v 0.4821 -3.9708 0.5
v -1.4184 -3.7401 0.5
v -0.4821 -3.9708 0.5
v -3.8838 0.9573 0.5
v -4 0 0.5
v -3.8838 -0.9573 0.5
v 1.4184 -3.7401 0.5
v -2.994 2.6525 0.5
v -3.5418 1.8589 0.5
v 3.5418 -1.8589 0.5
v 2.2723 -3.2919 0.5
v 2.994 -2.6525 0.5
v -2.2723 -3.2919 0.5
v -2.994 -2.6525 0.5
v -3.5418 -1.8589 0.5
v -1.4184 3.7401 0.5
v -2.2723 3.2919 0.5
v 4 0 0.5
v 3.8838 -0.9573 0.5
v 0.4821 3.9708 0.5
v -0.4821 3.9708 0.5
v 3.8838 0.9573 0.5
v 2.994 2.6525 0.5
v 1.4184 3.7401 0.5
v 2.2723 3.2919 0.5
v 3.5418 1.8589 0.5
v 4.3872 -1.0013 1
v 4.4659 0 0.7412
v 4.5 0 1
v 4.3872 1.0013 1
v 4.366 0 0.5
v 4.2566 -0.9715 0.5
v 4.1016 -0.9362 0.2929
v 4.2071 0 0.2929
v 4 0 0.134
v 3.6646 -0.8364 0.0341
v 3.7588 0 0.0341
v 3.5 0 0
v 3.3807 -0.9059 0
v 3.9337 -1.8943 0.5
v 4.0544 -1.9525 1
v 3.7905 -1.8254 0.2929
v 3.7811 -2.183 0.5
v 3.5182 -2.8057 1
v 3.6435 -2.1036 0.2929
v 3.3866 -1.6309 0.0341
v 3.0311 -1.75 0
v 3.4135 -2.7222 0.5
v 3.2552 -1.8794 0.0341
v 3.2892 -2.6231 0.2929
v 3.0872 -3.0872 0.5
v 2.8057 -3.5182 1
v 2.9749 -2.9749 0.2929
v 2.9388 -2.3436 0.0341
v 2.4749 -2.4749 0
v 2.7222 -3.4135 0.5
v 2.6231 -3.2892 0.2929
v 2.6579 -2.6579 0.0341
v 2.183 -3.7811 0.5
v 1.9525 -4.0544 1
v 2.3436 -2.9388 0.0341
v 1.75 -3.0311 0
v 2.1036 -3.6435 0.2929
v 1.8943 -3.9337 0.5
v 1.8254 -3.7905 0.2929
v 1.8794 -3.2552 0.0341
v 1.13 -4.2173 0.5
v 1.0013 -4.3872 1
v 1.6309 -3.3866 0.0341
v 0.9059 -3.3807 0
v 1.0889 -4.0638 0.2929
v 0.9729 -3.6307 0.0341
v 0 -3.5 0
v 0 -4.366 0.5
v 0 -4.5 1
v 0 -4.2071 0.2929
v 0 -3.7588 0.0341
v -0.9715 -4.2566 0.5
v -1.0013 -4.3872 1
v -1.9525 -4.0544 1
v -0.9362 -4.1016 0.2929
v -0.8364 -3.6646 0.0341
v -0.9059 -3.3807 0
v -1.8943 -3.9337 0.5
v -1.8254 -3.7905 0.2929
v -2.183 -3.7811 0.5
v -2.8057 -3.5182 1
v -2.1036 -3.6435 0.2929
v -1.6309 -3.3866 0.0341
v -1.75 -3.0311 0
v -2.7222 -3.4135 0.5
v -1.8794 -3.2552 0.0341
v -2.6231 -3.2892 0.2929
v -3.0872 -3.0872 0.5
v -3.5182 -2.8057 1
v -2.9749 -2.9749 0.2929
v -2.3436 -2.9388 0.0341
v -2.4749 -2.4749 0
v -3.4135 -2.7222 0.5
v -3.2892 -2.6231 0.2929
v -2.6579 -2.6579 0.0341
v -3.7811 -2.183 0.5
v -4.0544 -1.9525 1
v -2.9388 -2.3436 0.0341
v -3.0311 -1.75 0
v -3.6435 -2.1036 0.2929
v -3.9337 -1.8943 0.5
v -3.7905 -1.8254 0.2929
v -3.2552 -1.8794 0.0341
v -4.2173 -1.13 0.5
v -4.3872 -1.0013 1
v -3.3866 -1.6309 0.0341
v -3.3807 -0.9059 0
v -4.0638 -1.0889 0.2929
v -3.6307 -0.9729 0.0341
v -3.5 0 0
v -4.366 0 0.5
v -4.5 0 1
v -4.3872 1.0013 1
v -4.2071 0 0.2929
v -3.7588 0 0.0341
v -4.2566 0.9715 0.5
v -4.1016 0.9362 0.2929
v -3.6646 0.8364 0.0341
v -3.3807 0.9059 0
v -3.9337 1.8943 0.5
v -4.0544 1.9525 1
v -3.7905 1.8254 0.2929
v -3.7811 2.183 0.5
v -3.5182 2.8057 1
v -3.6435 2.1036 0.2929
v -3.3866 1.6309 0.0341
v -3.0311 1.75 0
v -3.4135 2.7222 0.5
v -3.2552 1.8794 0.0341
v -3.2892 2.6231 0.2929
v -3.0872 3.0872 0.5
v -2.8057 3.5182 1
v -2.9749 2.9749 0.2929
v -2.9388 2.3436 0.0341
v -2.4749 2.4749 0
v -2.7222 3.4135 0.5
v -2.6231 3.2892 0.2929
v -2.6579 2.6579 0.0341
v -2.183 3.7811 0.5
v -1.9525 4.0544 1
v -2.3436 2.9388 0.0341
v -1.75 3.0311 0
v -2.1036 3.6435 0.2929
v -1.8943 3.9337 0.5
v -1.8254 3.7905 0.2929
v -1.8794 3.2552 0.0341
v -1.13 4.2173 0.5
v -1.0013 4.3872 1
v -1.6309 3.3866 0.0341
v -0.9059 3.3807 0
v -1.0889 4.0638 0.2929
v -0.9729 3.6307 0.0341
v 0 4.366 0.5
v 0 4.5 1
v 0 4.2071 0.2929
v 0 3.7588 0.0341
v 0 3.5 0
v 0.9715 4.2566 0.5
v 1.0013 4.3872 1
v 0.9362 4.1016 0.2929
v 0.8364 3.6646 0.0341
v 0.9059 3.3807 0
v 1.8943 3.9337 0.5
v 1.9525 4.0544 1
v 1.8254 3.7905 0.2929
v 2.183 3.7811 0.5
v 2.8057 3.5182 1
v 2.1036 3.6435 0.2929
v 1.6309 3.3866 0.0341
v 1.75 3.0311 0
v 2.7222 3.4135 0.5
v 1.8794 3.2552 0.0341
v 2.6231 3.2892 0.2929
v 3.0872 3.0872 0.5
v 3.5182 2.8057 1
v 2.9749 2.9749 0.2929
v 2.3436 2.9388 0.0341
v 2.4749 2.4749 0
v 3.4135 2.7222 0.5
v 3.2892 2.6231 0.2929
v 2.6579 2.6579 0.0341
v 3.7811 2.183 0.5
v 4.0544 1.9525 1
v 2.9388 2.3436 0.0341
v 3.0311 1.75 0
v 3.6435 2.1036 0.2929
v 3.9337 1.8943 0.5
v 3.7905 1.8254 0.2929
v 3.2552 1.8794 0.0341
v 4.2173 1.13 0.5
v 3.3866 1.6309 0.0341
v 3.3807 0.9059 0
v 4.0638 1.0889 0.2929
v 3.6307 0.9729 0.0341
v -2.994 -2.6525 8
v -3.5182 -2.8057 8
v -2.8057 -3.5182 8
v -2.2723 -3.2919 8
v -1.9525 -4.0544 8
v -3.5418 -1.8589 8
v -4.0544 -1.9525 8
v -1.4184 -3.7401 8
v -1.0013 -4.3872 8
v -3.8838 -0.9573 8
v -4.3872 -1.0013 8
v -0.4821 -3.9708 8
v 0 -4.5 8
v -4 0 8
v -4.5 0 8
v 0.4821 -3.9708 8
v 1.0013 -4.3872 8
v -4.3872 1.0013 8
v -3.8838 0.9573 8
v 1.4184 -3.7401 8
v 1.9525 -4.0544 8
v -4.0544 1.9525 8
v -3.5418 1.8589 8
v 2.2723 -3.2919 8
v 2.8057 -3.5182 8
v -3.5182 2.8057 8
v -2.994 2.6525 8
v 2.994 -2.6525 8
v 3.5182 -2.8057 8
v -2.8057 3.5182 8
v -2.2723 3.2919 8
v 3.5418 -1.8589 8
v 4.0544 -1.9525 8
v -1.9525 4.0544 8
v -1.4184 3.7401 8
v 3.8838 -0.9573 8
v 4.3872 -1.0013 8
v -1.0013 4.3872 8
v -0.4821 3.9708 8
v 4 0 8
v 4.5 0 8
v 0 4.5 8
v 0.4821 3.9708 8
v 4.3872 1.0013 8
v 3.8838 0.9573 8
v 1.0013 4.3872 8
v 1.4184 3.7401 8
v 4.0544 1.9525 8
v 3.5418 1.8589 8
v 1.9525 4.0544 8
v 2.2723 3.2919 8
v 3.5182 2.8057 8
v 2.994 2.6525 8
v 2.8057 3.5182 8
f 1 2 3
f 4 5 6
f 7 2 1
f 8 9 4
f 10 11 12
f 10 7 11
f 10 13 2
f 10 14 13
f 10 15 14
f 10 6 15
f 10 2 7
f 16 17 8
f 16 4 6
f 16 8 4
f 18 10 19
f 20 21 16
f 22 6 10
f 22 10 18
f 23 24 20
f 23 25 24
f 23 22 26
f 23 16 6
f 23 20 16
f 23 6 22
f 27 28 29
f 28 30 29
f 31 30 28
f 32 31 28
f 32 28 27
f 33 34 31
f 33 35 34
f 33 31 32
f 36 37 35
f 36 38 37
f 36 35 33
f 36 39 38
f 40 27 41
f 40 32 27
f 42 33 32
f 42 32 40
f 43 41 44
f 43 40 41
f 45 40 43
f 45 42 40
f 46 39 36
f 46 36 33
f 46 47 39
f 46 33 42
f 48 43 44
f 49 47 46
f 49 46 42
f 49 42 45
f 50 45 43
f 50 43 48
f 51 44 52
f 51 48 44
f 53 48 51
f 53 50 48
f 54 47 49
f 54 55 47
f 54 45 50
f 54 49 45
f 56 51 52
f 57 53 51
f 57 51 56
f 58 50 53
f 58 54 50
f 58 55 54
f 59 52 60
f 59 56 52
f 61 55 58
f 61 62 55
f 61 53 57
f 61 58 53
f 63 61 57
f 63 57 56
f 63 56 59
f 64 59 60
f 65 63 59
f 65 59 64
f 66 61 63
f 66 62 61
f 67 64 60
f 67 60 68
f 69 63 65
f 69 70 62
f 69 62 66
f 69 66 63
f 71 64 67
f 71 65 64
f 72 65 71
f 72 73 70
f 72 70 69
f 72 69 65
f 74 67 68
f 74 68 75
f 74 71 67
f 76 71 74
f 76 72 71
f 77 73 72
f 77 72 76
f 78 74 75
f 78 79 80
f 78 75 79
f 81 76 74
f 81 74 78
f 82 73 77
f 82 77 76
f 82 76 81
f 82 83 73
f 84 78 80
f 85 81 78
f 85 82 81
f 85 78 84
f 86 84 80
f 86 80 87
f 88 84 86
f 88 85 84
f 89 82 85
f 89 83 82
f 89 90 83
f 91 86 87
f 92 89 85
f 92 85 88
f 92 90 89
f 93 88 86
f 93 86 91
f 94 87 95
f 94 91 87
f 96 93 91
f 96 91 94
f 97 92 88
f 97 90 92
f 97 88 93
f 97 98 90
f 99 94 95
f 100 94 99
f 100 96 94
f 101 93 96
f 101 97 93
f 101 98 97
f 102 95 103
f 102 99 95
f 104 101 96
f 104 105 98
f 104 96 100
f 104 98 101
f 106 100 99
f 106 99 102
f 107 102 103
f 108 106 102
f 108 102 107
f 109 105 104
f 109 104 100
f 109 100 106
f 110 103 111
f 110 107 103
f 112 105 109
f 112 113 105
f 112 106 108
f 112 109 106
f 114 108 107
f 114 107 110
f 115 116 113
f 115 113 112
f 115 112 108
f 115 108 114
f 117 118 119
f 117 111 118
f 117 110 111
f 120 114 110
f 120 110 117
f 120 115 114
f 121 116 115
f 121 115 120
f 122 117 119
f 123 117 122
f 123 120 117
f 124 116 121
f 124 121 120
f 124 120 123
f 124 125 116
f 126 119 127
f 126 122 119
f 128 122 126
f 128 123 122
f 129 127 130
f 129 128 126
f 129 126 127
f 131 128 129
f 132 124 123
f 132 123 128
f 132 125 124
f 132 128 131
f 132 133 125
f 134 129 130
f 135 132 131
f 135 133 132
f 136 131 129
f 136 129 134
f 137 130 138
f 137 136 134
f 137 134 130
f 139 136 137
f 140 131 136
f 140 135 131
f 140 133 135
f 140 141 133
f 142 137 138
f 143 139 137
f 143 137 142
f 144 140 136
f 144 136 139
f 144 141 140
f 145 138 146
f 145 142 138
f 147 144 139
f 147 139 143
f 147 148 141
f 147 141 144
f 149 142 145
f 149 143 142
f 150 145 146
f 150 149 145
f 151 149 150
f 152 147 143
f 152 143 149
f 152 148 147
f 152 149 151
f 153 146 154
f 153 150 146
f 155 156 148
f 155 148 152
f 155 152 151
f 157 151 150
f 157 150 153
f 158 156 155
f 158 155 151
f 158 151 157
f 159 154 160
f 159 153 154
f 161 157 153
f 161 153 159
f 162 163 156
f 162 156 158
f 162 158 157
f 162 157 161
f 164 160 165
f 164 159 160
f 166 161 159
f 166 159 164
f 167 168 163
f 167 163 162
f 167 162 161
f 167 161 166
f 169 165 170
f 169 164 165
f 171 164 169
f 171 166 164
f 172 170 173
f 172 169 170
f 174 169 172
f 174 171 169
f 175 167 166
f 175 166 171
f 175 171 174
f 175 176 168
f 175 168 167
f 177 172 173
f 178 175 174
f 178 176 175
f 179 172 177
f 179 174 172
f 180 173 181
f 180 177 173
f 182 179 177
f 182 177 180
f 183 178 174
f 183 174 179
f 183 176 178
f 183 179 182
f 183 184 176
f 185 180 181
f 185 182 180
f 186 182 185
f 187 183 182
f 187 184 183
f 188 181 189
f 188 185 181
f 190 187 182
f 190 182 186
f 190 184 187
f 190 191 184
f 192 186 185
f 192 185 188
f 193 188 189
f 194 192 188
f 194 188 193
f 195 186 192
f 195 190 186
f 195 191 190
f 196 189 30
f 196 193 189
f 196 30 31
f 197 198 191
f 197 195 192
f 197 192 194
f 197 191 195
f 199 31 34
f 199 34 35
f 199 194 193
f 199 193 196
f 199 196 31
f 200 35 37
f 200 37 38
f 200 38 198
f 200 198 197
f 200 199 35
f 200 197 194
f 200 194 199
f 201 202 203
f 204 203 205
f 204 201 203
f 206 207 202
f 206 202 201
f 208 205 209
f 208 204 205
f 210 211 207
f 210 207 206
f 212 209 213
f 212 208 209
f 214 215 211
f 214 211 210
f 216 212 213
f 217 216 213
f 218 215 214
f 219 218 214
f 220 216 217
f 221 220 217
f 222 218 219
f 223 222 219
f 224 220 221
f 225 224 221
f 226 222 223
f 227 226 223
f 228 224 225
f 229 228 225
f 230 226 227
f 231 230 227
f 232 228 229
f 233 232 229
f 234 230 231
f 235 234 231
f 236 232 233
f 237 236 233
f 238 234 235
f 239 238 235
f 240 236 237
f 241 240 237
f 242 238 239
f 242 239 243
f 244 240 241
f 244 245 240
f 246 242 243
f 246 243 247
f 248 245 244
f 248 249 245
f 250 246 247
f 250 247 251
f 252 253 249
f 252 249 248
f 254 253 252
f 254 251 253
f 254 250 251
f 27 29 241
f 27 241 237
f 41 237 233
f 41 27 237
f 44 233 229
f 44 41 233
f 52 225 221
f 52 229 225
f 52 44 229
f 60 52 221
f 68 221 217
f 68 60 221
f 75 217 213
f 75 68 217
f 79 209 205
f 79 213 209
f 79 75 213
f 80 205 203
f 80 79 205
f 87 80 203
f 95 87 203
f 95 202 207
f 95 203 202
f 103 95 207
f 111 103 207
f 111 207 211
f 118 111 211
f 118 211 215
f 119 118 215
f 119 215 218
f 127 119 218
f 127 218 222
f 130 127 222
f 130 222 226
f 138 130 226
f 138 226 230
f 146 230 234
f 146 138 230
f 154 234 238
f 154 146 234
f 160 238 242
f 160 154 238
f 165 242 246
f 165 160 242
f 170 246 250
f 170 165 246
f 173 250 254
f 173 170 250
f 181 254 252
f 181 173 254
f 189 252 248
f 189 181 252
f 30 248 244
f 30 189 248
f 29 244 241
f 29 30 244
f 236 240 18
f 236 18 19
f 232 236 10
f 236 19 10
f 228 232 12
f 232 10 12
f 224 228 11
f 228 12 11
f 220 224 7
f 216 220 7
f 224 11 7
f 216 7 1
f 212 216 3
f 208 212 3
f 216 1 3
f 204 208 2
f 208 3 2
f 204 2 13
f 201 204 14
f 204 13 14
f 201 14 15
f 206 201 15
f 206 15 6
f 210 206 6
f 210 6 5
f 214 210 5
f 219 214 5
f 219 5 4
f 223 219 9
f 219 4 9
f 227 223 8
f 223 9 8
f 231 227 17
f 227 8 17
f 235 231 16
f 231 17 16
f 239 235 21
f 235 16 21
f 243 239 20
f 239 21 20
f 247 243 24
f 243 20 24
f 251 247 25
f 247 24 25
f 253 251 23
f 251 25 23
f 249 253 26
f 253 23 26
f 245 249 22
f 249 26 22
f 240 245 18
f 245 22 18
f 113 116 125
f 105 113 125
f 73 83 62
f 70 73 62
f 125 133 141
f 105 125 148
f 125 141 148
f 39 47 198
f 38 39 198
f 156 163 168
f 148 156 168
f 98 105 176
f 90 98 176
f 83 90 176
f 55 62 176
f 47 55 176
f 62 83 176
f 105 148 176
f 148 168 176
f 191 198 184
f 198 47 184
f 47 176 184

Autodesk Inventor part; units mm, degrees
ref_plane "YZ Plane" through (0, 0, 0) normal (1, 0, 0) x (0, 1, 0)
ref_plane "XZ Plane" through (0, 0, 0) normal (0, 1, 0) x (-1, 0, 0)
ref_plane "XY Plane" through (0, 0, 0) normal (0, 0, 1) x (1, 0, 0)
sketch "Szkic1" plane through (0, 0, 0) normal (0, 0, 1) x (1, 0, 0)
  circle A0 centre (0, 0) radius 4.5
  dimension "d0" = 9
extrude "Wyciągnięcie proste1" add sketch "Szkic1" along normal blind 8
shell "Skorupa1" thickness 0.5 removed faces 1 at (0.1808, 1.316, 8)
thread "Gwint1" size "M8x0.8" class "6H" standard "ANSI Metric M Profile" full length
fillet "Zaokrąglenie1" radius 1 1 edges at (-4.5, 0, 0)
properties part number "Nakrętka_wentyla" material "Aluminium AW-7020"
